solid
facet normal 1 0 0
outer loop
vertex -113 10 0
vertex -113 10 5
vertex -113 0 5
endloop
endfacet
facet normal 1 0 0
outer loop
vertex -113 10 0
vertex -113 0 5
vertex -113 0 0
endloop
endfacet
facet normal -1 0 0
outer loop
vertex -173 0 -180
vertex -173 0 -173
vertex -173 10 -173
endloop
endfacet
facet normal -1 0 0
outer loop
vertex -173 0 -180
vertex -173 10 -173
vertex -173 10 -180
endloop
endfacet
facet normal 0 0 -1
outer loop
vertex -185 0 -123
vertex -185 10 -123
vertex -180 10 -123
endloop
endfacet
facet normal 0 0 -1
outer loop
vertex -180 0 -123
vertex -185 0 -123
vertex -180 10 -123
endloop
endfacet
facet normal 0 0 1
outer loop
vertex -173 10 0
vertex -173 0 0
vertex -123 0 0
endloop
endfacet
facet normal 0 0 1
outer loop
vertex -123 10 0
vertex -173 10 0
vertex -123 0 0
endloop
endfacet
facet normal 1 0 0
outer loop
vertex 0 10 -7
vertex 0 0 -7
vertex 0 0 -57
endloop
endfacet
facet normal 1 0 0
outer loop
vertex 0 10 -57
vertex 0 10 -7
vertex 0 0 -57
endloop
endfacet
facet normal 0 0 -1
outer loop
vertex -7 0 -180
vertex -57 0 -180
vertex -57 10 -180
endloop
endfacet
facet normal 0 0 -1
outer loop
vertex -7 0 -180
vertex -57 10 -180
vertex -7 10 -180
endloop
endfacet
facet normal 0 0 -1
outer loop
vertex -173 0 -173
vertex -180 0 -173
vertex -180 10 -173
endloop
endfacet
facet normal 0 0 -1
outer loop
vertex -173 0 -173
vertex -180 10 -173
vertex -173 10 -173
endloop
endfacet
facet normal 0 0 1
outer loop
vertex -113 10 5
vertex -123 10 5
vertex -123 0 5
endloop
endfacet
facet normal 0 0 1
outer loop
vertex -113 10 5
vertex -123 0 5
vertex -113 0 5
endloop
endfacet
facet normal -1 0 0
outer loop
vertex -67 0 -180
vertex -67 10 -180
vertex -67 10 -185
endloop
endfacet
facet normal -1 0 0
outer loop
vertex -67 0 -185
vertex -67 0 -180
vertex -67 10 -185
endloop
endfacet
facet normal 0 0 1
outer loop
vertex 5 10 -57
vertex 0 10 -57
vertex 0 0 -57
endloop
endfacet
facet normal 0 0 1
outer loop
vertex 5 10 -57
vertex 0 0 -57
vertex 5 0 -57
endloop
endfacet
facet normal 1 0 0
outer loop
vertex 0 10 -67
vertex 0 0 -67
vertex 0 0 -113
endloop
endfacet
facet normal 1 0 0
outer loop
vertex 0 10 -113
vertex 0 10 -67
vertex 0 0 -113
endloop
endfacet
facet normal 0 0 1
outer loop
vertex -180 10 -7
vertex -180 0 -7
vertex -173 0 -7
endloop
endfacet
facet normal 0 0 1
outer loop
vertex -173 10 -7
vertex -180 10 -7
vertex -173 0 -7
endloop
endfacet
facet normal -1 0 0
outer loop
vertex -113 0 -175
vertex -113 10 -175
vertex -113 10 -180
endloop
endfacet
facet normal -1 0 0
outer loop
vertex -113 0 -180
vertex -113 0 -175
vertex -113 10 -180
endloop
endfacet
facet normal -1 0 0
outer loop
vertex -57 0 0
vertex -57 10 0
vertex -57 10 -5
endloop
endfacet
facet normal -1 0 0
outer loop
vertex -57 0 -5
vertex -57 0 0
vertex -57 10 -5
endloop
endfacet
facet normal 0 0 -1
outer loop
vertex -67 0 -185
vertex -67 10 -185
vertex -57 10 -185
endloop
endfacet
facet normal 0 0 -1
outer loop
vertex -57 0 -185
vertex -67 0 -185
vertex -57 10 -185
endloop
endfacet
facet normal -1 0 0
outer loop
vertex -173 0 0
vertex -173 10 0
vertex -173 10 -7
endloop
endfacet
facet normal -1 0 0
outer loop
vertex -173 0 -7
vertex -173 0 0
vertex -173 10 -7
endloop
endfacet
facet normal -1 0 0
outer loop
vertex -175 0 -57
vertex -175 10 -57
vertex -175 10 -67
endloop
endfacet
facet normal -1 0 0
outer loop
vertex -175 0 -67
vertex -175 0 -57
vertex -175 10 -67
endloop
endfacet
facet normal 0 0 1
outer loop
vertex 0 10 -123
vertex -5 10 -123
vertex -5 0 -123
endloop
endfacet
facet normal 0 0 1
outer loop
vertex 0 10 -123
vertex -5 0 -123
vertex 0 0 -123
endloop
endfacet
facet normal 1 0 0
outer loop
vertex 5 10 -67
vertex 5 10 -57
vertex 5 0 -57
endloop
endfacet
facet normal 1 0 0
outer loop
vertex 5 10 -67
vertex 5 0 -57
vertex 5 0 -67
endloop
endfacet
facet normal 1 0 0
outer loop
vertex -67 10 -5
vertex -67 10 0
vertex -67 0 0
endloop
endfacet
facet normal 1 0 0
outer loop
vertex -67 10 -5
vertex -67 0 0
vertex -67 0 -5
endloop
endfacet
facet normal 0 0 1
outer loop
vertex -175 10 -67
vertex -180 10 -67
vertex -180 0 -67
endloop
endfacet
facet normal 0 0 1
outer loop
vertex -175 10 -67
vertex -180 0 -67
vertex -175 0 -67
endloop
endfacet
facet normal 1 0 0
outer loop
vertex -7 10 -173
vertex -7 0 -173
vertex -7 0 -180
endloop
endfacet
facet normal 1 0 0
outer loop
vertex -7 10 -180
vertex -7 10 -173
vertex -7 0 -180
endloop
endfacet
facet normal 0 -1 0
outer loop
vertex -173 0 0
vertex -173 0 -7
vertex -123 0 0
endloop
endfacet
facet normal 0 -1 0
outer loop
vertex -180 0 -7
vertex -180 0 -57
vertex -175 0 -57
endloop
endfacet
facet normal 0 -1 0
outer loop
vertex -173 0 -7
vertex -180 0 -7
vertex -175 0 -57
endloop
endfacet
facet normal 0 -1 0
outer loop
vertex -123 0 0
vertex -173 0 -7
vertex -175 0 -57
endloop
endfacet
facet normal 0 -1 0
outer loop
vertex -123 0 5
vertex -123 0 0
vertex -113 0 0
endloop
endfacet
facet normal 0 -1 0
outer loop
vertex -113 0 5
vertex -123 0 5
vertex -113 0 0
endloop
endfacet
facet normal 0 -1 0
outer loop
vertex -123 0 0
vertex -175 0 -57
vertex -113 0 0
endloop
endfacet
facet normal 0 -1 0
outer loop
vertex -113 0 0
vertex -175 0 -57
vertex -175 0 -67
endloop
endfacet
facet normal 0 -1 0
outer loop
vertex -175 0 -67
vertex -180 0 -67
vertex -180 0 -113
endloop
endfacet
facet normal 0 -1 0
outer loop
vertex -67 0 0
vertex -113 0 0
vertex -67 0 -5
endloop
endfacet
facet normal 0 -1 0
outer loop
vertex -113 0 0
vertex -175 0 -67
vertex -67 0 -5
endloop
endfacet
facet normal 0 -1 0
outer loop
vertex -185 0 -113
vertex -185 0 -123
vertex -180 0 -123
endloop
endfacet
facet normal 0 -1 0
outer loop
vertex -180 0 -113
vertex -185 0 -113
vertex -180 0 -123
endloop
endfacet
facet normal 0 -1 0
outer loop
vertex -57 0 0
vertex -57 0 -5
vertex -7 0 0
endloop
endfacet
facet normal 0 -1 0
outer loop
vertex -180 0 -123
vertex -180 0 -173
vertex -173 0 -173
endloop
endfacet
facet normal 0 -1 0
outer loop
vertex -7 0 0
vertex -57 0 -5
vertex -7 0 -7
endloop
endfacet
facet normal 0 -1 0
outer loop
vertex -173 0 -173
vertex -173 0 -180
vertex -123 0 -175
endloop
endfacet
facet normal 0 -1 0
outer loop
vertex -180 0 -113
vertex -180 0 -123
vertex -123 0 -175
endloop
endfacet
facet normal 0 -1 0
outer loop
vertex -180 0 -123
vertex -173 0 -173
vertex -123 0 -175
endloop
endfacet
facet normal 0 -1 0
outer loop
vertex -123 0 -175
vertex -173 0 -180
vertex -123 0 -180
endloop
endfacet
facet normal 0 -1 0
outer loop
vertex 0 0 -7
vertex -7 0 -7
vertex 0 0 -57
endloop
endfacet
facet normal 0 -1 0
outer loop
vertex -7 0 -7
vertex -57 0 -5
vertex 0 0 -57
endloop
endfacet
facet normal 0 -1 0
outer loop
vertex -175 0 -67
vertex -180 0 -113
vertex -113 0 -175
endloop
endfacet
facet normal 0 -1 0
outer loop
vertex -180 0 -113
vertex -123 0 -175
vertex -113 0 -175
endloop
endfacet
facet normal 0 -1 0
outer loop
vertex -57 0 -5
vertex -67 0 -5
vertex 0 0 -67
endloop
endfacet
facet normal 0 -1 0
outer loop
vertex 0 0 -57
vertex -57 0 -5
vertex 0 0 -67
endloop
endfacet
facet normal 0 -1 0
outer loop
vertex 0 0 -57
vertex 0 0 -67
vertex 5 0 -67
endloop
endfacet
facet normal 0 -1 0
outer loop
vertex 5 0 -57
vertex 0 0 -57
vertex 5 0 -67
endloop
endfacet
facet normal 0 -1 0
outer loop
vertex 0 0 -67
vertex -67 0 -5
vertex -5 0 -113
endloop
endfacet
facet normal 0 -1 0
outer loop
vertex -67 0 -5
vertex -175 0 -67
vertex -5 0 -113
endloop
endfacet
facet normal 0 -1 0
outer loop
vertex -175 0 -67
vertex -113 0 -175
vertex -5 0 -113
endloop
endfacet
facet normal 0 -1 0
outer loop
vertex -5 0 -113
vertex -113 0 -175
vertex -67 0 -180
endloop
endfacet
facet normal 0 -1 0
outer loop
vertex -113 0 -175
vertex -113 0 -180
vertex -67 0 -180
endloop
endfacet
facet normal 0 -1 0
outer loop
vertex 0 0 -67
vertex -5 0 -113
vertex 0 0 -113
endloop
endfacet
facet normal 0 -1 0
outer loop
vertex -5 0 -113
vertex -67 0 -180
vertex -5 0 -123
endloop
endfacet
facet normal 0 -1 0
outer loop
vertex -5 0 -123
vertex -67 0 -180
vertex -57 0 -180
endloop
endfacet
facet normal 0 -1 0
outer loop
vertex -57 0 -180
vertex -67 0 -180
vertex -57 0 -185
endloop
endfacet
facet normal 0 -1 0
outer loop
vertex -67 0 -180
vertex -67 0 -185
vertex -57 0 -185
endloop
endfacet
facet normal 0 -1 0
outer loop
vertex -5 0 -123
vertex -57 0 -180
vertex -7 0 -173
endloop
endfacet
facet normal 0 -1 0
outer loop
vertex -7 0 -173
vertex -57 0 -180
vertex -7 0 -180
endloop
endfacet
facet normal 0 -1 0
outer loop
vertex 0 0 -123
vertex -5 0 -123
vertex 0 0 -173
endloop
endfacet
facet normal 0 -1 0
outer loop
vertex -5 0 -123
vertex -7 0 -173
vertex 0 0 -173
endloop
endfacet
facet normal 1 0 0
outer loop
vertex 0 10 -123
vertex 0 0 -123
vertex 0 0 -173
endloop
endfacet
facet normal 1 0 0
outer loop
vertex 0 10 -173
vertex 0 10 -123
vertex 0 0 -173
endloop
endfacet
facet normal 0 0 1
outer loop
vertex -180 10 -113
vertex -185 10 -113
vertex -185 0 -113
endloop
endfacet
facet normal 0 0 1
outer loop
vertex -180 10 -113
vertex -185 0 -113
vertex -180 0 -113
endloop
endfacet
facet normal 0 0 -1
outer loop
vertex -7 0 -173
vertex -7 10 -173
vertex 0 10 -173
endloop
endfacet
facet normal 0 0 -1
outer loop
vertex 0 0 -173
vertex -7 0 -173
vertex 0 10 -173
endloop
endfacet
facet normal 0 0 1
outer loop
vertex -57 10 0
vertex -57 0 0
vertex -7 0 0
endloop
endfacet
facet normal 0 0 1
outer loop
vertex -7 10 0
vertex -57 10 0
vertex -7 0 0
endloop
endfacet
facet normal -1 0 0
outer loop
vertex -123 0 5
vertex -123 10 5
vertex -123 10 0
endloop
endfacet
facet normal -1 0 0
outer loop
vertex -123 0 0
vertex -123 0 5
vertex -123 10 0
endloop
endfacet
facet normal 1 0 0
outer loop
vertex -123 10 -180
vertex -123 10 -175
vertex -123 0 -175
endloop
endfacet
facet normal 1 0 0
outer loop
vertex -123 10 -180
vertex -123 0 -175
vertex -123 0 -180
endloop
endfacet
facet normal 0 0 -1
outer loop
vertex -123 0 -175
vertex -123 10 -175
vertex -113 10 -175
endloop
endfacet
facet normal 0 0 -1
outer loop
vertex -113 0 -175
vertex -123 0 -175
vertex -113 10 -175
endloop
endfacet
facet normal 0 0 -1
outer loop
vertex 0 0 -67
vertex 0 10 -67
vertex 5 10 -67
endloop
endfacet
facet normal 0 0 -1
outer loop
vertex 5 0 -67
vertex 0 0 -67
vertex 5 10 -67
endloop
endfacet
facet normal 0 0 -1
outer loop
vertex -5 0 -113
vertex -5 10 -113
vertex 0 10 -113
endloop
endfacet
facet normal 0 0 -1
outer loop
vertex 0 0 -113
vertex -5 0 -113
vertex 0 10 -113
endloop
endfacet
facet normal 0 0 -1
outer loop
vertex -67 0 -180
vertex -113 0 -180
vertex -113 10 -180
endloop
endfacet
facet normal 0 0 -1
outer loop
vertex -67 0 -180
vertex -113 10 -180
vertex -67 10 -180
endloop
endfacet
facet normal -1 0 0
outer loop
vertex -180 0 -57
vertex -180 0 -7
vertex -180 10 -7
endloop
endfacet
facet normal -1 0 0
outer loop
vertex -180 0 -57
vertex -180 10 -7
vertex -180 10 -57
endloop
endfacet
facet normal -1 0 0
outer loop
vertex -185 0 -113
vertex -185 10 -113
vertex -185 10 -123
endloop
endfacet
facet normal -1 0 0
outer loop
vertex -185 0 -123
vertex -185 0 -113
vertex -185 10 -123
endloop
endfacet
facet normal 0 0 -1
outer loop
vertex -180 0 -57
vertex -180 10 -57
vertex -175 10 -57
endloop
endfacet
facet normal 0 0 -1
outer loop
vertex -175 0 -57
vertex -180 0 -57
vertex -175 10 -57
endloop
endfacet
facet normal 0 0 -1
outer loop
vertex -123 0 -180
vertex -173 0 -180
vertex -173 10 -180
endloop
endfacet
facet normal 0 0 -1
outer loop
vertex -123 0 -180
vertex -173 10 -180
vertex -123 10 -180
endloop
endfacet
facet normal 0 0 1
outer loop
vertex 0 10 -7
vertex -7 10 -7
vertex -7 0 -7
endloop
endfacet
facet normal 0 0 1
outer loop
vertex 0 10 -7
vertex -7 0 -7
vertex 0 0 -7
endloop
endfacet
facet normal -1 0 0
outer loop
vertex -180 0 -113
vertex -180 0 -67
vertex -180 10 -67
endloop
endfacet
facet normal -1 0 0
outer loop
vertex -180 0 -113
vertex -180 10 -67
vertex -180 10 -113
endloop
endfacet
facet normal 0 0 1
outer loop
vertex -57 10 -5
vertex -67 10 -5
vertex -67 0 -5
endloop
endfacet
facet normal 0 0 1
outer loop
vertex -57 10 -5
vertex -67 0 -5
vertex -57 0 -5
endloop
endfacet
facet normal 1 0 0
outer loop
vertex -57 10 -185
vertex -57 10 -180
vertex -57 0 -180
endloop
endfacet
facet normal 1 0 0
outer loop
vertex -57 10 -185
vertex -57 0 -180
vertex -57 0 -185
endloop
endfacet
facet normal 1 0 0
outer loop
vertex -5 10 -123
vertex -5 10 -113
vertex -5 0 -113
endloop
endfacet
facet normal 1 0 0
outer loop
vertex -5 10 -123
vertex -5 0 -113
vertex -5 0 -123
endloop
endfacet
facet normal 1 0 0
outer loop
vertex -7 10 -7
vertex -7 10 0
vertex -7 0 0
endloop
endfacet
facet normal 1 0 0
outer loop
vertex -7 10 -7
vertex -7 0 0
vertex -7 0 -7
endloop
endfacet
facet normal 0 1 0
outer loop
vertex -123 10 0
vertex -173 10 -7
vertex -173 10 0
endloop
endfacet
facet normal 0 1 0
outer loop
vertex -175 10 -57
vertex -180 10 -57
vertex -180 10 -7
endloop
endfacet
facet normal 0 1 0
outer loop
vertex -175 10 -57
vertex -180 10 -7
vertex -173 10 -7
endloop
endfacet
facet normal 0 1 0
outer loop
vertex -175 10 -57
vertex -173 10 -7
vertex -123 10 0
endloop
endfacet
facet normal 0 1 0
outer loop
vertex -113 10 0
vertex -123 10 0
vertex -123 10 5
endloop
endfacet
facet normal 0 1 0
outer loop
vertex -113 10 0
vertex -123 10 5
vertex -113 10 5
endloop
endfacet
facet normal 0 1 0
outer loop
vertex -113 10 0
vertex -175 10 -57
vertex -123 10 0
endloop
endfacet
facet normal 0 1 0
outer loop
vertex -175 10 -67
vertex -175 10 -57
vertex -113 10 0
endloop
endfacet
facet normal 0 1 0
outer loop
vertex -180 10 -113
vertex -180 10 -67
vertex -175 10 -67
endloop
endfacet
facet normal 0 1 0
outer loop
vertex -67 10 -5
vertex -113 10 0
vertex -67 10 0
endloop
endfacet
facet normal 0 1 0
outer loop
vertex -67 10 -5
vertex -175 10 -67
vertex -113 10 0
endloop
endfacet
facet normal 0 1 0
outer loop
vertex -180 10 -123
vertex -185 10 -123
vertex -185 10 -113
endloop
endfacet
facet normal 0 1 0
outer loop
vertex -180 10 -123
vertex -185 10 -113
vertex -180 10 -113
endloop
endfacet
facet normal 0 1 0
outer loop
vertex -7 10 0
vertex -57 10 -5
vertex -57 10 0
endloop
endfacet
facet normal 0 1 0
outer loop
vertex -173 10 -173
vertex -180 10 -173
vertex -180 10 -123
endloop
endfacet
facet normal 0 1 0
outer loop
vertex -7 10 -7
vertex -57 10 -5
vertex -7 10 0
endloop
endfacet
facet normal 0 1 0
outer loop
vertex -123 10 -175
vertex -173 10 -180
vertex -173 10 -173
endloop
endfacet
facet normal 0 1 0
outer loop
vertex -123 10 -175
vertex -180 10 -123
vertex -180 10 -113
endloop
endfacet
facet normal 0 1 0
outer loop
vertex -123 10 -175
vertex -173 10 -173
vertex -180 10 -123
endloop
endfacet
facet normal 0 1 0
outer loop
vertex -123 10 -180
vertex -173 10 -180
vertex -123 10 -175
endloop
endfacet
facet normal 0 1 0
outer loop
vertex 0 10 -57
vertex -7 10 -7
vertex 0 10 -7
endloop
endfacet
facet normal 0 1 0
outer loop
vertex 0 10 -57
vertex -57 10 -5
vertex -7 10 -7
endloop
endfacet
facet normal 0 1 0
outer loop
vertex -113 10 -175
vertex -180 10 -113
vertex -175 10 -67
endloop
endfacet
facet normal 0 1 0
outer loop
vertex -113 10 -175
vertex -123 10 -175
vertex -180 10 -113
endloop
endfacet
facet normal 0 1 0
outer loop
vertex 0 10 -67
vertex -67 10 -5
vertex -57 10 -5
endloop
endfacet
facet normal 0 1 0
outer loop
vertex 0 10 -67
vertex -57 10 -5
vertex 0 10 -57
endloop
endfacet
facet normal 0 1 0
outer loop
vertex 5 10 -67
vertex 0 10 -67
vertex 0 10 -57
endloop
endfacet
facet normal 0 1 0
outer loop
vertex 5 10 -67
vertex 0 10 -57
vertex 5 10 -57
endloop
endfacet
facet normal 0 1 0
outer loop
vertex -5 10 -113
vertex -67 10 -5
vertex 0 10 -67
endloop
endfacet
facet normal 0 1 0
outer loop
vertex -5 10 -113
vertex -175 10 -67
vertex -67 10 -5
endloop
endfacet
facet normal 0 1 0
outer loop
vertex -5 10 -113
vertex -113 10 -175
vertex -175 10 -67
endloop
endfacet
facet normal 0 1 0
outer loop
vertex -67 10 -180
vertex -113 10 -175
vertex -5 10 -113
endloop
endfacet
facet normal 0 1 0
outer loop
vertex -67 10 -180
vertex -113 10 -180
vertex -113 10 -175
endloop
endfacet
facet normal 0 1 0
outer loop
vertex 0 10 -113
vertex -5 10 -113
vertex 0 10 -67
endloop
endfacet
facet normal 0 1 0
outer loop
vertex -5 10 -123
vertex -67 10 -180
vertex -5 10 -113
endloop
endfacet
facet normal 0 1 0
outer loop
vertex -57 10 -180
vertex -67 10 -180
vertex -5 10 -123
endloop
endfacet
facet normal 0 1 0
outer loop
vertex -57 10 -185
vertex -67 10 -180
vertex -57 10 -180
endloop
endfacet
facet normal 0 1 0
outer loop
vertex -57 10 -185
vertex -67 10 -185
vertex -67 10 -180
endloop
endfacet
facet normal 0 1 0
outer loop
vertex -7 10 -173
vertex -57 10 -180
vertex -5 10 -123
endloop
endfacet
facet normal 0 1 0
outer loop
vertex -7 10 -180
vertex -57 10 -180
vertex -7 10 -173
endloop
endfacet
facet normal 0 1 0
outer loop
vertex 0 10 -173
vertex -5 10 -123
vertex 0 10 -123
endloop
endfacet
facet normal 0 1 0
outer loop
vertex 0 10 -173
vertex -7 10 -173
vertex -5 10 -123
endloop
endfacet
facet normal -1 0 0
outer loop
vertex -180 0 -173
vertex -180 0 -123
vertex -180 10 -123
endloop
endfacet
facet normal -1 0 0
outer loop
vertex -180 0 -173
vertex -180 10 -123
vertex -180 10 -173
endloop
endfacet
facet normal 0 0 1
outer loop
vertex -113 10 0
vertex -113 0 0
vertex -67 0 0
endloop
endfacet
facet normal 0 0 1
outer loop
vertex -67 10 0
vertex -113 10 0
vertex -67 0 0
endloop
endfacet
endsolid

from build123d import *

# Parameters (mm, degrees)
SKETCH2_W           = 180
SKETCH2_H           = 180
BOSS_EXTRUDE1_DEPTH = 10
SKETCH9_W           = 14
SKETCH9_H           = 14
CUT_EXTRUDE2_DEPTH  = 10
SKETCH10_W          = 10
SKETCH10_H          = 10
BOSS_EXTRUDE2_DEPTH = 10
SKETCH11_W          = 10
SKETCH11_H          = 10
CUT_EXTRUDE3_DEPTH  = 10


with BuildPart() as part:
    # Sketch2 → Boss-Extrude1 (new body)
    with BuildSketch(Plane(origin=(0, 0, 0), x_dir=(1, 0, 0), z_dir=(0, 1, 0))):
        with Locations((-90, 90)):
            Rectangle(SKETCH2_W, SKETCH2_H)
    extrude(amount=BOSS_EXTRUDE1_DEPTH)

    # Sketch9 → Cut-Extrude2 (cut)
    with BuildSketch(Plane(origin=(0, 10, 0), x_dir=(1, 0, 0), z_dir=(0, 1, 0))):
        Rectangle(SKETCH9_W, SKETCH9_H)
        with Locations((-180, 0)):
            Rectangle(SKETCH9_W, SKETCH9_H)
        with Locations((-180, 180)):
            Rectangle(SKETCH9_W, SKETCH9_H)
        with Locations((0, 180)):
            Rectangle(SKETCH9_W, SKETCH9_H)
    extrude(amount=-CUT_EXTRUDE2_DEPTH, mode=Mode.SUBTRACT)

    # Sketch10 → Boss-Extrude2 (add)
    with BuildSketch(Plane(origin=(0, 10, 0), x_dir=(1, 0, 0), z_dir=(0, 1, 0))):
        with Locations((-180, 118)):
            Rectangle(SKETCH10_W, SKETCH10_H)
        with Locations((0, 62)):
            Rectangle(SKETCH10_W, SKETCH10_H)
        with Locations((-118, 0)):
            Rectangle(SKETCH10_W, SKETCH10_H)
        with Locations((-62, 180)):
            Rectangle(SKETCH10_W, SKETCH10_H)
    extrude(amount=-BOSS_EXTRUDE2_DEPTH)

    # Sketch11 → Cut-Extrude3 (cut)
    with BuildSketch(Plane(origin=(0, 10, 10), x_dir=(1, 0, 0), z_dir=(0, 1, 0))):
        with Locations((-180, 72)):
            Rectangle(SKETCH11_W, SKETCH11_H)
        with Locations((-62, 10)):
            Rectangle(SKETCH11_W, SKETCH11_H)
        with Locations((-118, 190)):
            Rectangle(SKETCH11_W, SKETCH11_H)
        with Locations((0, 128)):
            Rectangle(SKETCH11_W, SKETCH11_H)
    extrude(amount=-CUT_EXTRUDE3_DEPTH, mode=Mode.SUBTRACT)


solid = part.part
